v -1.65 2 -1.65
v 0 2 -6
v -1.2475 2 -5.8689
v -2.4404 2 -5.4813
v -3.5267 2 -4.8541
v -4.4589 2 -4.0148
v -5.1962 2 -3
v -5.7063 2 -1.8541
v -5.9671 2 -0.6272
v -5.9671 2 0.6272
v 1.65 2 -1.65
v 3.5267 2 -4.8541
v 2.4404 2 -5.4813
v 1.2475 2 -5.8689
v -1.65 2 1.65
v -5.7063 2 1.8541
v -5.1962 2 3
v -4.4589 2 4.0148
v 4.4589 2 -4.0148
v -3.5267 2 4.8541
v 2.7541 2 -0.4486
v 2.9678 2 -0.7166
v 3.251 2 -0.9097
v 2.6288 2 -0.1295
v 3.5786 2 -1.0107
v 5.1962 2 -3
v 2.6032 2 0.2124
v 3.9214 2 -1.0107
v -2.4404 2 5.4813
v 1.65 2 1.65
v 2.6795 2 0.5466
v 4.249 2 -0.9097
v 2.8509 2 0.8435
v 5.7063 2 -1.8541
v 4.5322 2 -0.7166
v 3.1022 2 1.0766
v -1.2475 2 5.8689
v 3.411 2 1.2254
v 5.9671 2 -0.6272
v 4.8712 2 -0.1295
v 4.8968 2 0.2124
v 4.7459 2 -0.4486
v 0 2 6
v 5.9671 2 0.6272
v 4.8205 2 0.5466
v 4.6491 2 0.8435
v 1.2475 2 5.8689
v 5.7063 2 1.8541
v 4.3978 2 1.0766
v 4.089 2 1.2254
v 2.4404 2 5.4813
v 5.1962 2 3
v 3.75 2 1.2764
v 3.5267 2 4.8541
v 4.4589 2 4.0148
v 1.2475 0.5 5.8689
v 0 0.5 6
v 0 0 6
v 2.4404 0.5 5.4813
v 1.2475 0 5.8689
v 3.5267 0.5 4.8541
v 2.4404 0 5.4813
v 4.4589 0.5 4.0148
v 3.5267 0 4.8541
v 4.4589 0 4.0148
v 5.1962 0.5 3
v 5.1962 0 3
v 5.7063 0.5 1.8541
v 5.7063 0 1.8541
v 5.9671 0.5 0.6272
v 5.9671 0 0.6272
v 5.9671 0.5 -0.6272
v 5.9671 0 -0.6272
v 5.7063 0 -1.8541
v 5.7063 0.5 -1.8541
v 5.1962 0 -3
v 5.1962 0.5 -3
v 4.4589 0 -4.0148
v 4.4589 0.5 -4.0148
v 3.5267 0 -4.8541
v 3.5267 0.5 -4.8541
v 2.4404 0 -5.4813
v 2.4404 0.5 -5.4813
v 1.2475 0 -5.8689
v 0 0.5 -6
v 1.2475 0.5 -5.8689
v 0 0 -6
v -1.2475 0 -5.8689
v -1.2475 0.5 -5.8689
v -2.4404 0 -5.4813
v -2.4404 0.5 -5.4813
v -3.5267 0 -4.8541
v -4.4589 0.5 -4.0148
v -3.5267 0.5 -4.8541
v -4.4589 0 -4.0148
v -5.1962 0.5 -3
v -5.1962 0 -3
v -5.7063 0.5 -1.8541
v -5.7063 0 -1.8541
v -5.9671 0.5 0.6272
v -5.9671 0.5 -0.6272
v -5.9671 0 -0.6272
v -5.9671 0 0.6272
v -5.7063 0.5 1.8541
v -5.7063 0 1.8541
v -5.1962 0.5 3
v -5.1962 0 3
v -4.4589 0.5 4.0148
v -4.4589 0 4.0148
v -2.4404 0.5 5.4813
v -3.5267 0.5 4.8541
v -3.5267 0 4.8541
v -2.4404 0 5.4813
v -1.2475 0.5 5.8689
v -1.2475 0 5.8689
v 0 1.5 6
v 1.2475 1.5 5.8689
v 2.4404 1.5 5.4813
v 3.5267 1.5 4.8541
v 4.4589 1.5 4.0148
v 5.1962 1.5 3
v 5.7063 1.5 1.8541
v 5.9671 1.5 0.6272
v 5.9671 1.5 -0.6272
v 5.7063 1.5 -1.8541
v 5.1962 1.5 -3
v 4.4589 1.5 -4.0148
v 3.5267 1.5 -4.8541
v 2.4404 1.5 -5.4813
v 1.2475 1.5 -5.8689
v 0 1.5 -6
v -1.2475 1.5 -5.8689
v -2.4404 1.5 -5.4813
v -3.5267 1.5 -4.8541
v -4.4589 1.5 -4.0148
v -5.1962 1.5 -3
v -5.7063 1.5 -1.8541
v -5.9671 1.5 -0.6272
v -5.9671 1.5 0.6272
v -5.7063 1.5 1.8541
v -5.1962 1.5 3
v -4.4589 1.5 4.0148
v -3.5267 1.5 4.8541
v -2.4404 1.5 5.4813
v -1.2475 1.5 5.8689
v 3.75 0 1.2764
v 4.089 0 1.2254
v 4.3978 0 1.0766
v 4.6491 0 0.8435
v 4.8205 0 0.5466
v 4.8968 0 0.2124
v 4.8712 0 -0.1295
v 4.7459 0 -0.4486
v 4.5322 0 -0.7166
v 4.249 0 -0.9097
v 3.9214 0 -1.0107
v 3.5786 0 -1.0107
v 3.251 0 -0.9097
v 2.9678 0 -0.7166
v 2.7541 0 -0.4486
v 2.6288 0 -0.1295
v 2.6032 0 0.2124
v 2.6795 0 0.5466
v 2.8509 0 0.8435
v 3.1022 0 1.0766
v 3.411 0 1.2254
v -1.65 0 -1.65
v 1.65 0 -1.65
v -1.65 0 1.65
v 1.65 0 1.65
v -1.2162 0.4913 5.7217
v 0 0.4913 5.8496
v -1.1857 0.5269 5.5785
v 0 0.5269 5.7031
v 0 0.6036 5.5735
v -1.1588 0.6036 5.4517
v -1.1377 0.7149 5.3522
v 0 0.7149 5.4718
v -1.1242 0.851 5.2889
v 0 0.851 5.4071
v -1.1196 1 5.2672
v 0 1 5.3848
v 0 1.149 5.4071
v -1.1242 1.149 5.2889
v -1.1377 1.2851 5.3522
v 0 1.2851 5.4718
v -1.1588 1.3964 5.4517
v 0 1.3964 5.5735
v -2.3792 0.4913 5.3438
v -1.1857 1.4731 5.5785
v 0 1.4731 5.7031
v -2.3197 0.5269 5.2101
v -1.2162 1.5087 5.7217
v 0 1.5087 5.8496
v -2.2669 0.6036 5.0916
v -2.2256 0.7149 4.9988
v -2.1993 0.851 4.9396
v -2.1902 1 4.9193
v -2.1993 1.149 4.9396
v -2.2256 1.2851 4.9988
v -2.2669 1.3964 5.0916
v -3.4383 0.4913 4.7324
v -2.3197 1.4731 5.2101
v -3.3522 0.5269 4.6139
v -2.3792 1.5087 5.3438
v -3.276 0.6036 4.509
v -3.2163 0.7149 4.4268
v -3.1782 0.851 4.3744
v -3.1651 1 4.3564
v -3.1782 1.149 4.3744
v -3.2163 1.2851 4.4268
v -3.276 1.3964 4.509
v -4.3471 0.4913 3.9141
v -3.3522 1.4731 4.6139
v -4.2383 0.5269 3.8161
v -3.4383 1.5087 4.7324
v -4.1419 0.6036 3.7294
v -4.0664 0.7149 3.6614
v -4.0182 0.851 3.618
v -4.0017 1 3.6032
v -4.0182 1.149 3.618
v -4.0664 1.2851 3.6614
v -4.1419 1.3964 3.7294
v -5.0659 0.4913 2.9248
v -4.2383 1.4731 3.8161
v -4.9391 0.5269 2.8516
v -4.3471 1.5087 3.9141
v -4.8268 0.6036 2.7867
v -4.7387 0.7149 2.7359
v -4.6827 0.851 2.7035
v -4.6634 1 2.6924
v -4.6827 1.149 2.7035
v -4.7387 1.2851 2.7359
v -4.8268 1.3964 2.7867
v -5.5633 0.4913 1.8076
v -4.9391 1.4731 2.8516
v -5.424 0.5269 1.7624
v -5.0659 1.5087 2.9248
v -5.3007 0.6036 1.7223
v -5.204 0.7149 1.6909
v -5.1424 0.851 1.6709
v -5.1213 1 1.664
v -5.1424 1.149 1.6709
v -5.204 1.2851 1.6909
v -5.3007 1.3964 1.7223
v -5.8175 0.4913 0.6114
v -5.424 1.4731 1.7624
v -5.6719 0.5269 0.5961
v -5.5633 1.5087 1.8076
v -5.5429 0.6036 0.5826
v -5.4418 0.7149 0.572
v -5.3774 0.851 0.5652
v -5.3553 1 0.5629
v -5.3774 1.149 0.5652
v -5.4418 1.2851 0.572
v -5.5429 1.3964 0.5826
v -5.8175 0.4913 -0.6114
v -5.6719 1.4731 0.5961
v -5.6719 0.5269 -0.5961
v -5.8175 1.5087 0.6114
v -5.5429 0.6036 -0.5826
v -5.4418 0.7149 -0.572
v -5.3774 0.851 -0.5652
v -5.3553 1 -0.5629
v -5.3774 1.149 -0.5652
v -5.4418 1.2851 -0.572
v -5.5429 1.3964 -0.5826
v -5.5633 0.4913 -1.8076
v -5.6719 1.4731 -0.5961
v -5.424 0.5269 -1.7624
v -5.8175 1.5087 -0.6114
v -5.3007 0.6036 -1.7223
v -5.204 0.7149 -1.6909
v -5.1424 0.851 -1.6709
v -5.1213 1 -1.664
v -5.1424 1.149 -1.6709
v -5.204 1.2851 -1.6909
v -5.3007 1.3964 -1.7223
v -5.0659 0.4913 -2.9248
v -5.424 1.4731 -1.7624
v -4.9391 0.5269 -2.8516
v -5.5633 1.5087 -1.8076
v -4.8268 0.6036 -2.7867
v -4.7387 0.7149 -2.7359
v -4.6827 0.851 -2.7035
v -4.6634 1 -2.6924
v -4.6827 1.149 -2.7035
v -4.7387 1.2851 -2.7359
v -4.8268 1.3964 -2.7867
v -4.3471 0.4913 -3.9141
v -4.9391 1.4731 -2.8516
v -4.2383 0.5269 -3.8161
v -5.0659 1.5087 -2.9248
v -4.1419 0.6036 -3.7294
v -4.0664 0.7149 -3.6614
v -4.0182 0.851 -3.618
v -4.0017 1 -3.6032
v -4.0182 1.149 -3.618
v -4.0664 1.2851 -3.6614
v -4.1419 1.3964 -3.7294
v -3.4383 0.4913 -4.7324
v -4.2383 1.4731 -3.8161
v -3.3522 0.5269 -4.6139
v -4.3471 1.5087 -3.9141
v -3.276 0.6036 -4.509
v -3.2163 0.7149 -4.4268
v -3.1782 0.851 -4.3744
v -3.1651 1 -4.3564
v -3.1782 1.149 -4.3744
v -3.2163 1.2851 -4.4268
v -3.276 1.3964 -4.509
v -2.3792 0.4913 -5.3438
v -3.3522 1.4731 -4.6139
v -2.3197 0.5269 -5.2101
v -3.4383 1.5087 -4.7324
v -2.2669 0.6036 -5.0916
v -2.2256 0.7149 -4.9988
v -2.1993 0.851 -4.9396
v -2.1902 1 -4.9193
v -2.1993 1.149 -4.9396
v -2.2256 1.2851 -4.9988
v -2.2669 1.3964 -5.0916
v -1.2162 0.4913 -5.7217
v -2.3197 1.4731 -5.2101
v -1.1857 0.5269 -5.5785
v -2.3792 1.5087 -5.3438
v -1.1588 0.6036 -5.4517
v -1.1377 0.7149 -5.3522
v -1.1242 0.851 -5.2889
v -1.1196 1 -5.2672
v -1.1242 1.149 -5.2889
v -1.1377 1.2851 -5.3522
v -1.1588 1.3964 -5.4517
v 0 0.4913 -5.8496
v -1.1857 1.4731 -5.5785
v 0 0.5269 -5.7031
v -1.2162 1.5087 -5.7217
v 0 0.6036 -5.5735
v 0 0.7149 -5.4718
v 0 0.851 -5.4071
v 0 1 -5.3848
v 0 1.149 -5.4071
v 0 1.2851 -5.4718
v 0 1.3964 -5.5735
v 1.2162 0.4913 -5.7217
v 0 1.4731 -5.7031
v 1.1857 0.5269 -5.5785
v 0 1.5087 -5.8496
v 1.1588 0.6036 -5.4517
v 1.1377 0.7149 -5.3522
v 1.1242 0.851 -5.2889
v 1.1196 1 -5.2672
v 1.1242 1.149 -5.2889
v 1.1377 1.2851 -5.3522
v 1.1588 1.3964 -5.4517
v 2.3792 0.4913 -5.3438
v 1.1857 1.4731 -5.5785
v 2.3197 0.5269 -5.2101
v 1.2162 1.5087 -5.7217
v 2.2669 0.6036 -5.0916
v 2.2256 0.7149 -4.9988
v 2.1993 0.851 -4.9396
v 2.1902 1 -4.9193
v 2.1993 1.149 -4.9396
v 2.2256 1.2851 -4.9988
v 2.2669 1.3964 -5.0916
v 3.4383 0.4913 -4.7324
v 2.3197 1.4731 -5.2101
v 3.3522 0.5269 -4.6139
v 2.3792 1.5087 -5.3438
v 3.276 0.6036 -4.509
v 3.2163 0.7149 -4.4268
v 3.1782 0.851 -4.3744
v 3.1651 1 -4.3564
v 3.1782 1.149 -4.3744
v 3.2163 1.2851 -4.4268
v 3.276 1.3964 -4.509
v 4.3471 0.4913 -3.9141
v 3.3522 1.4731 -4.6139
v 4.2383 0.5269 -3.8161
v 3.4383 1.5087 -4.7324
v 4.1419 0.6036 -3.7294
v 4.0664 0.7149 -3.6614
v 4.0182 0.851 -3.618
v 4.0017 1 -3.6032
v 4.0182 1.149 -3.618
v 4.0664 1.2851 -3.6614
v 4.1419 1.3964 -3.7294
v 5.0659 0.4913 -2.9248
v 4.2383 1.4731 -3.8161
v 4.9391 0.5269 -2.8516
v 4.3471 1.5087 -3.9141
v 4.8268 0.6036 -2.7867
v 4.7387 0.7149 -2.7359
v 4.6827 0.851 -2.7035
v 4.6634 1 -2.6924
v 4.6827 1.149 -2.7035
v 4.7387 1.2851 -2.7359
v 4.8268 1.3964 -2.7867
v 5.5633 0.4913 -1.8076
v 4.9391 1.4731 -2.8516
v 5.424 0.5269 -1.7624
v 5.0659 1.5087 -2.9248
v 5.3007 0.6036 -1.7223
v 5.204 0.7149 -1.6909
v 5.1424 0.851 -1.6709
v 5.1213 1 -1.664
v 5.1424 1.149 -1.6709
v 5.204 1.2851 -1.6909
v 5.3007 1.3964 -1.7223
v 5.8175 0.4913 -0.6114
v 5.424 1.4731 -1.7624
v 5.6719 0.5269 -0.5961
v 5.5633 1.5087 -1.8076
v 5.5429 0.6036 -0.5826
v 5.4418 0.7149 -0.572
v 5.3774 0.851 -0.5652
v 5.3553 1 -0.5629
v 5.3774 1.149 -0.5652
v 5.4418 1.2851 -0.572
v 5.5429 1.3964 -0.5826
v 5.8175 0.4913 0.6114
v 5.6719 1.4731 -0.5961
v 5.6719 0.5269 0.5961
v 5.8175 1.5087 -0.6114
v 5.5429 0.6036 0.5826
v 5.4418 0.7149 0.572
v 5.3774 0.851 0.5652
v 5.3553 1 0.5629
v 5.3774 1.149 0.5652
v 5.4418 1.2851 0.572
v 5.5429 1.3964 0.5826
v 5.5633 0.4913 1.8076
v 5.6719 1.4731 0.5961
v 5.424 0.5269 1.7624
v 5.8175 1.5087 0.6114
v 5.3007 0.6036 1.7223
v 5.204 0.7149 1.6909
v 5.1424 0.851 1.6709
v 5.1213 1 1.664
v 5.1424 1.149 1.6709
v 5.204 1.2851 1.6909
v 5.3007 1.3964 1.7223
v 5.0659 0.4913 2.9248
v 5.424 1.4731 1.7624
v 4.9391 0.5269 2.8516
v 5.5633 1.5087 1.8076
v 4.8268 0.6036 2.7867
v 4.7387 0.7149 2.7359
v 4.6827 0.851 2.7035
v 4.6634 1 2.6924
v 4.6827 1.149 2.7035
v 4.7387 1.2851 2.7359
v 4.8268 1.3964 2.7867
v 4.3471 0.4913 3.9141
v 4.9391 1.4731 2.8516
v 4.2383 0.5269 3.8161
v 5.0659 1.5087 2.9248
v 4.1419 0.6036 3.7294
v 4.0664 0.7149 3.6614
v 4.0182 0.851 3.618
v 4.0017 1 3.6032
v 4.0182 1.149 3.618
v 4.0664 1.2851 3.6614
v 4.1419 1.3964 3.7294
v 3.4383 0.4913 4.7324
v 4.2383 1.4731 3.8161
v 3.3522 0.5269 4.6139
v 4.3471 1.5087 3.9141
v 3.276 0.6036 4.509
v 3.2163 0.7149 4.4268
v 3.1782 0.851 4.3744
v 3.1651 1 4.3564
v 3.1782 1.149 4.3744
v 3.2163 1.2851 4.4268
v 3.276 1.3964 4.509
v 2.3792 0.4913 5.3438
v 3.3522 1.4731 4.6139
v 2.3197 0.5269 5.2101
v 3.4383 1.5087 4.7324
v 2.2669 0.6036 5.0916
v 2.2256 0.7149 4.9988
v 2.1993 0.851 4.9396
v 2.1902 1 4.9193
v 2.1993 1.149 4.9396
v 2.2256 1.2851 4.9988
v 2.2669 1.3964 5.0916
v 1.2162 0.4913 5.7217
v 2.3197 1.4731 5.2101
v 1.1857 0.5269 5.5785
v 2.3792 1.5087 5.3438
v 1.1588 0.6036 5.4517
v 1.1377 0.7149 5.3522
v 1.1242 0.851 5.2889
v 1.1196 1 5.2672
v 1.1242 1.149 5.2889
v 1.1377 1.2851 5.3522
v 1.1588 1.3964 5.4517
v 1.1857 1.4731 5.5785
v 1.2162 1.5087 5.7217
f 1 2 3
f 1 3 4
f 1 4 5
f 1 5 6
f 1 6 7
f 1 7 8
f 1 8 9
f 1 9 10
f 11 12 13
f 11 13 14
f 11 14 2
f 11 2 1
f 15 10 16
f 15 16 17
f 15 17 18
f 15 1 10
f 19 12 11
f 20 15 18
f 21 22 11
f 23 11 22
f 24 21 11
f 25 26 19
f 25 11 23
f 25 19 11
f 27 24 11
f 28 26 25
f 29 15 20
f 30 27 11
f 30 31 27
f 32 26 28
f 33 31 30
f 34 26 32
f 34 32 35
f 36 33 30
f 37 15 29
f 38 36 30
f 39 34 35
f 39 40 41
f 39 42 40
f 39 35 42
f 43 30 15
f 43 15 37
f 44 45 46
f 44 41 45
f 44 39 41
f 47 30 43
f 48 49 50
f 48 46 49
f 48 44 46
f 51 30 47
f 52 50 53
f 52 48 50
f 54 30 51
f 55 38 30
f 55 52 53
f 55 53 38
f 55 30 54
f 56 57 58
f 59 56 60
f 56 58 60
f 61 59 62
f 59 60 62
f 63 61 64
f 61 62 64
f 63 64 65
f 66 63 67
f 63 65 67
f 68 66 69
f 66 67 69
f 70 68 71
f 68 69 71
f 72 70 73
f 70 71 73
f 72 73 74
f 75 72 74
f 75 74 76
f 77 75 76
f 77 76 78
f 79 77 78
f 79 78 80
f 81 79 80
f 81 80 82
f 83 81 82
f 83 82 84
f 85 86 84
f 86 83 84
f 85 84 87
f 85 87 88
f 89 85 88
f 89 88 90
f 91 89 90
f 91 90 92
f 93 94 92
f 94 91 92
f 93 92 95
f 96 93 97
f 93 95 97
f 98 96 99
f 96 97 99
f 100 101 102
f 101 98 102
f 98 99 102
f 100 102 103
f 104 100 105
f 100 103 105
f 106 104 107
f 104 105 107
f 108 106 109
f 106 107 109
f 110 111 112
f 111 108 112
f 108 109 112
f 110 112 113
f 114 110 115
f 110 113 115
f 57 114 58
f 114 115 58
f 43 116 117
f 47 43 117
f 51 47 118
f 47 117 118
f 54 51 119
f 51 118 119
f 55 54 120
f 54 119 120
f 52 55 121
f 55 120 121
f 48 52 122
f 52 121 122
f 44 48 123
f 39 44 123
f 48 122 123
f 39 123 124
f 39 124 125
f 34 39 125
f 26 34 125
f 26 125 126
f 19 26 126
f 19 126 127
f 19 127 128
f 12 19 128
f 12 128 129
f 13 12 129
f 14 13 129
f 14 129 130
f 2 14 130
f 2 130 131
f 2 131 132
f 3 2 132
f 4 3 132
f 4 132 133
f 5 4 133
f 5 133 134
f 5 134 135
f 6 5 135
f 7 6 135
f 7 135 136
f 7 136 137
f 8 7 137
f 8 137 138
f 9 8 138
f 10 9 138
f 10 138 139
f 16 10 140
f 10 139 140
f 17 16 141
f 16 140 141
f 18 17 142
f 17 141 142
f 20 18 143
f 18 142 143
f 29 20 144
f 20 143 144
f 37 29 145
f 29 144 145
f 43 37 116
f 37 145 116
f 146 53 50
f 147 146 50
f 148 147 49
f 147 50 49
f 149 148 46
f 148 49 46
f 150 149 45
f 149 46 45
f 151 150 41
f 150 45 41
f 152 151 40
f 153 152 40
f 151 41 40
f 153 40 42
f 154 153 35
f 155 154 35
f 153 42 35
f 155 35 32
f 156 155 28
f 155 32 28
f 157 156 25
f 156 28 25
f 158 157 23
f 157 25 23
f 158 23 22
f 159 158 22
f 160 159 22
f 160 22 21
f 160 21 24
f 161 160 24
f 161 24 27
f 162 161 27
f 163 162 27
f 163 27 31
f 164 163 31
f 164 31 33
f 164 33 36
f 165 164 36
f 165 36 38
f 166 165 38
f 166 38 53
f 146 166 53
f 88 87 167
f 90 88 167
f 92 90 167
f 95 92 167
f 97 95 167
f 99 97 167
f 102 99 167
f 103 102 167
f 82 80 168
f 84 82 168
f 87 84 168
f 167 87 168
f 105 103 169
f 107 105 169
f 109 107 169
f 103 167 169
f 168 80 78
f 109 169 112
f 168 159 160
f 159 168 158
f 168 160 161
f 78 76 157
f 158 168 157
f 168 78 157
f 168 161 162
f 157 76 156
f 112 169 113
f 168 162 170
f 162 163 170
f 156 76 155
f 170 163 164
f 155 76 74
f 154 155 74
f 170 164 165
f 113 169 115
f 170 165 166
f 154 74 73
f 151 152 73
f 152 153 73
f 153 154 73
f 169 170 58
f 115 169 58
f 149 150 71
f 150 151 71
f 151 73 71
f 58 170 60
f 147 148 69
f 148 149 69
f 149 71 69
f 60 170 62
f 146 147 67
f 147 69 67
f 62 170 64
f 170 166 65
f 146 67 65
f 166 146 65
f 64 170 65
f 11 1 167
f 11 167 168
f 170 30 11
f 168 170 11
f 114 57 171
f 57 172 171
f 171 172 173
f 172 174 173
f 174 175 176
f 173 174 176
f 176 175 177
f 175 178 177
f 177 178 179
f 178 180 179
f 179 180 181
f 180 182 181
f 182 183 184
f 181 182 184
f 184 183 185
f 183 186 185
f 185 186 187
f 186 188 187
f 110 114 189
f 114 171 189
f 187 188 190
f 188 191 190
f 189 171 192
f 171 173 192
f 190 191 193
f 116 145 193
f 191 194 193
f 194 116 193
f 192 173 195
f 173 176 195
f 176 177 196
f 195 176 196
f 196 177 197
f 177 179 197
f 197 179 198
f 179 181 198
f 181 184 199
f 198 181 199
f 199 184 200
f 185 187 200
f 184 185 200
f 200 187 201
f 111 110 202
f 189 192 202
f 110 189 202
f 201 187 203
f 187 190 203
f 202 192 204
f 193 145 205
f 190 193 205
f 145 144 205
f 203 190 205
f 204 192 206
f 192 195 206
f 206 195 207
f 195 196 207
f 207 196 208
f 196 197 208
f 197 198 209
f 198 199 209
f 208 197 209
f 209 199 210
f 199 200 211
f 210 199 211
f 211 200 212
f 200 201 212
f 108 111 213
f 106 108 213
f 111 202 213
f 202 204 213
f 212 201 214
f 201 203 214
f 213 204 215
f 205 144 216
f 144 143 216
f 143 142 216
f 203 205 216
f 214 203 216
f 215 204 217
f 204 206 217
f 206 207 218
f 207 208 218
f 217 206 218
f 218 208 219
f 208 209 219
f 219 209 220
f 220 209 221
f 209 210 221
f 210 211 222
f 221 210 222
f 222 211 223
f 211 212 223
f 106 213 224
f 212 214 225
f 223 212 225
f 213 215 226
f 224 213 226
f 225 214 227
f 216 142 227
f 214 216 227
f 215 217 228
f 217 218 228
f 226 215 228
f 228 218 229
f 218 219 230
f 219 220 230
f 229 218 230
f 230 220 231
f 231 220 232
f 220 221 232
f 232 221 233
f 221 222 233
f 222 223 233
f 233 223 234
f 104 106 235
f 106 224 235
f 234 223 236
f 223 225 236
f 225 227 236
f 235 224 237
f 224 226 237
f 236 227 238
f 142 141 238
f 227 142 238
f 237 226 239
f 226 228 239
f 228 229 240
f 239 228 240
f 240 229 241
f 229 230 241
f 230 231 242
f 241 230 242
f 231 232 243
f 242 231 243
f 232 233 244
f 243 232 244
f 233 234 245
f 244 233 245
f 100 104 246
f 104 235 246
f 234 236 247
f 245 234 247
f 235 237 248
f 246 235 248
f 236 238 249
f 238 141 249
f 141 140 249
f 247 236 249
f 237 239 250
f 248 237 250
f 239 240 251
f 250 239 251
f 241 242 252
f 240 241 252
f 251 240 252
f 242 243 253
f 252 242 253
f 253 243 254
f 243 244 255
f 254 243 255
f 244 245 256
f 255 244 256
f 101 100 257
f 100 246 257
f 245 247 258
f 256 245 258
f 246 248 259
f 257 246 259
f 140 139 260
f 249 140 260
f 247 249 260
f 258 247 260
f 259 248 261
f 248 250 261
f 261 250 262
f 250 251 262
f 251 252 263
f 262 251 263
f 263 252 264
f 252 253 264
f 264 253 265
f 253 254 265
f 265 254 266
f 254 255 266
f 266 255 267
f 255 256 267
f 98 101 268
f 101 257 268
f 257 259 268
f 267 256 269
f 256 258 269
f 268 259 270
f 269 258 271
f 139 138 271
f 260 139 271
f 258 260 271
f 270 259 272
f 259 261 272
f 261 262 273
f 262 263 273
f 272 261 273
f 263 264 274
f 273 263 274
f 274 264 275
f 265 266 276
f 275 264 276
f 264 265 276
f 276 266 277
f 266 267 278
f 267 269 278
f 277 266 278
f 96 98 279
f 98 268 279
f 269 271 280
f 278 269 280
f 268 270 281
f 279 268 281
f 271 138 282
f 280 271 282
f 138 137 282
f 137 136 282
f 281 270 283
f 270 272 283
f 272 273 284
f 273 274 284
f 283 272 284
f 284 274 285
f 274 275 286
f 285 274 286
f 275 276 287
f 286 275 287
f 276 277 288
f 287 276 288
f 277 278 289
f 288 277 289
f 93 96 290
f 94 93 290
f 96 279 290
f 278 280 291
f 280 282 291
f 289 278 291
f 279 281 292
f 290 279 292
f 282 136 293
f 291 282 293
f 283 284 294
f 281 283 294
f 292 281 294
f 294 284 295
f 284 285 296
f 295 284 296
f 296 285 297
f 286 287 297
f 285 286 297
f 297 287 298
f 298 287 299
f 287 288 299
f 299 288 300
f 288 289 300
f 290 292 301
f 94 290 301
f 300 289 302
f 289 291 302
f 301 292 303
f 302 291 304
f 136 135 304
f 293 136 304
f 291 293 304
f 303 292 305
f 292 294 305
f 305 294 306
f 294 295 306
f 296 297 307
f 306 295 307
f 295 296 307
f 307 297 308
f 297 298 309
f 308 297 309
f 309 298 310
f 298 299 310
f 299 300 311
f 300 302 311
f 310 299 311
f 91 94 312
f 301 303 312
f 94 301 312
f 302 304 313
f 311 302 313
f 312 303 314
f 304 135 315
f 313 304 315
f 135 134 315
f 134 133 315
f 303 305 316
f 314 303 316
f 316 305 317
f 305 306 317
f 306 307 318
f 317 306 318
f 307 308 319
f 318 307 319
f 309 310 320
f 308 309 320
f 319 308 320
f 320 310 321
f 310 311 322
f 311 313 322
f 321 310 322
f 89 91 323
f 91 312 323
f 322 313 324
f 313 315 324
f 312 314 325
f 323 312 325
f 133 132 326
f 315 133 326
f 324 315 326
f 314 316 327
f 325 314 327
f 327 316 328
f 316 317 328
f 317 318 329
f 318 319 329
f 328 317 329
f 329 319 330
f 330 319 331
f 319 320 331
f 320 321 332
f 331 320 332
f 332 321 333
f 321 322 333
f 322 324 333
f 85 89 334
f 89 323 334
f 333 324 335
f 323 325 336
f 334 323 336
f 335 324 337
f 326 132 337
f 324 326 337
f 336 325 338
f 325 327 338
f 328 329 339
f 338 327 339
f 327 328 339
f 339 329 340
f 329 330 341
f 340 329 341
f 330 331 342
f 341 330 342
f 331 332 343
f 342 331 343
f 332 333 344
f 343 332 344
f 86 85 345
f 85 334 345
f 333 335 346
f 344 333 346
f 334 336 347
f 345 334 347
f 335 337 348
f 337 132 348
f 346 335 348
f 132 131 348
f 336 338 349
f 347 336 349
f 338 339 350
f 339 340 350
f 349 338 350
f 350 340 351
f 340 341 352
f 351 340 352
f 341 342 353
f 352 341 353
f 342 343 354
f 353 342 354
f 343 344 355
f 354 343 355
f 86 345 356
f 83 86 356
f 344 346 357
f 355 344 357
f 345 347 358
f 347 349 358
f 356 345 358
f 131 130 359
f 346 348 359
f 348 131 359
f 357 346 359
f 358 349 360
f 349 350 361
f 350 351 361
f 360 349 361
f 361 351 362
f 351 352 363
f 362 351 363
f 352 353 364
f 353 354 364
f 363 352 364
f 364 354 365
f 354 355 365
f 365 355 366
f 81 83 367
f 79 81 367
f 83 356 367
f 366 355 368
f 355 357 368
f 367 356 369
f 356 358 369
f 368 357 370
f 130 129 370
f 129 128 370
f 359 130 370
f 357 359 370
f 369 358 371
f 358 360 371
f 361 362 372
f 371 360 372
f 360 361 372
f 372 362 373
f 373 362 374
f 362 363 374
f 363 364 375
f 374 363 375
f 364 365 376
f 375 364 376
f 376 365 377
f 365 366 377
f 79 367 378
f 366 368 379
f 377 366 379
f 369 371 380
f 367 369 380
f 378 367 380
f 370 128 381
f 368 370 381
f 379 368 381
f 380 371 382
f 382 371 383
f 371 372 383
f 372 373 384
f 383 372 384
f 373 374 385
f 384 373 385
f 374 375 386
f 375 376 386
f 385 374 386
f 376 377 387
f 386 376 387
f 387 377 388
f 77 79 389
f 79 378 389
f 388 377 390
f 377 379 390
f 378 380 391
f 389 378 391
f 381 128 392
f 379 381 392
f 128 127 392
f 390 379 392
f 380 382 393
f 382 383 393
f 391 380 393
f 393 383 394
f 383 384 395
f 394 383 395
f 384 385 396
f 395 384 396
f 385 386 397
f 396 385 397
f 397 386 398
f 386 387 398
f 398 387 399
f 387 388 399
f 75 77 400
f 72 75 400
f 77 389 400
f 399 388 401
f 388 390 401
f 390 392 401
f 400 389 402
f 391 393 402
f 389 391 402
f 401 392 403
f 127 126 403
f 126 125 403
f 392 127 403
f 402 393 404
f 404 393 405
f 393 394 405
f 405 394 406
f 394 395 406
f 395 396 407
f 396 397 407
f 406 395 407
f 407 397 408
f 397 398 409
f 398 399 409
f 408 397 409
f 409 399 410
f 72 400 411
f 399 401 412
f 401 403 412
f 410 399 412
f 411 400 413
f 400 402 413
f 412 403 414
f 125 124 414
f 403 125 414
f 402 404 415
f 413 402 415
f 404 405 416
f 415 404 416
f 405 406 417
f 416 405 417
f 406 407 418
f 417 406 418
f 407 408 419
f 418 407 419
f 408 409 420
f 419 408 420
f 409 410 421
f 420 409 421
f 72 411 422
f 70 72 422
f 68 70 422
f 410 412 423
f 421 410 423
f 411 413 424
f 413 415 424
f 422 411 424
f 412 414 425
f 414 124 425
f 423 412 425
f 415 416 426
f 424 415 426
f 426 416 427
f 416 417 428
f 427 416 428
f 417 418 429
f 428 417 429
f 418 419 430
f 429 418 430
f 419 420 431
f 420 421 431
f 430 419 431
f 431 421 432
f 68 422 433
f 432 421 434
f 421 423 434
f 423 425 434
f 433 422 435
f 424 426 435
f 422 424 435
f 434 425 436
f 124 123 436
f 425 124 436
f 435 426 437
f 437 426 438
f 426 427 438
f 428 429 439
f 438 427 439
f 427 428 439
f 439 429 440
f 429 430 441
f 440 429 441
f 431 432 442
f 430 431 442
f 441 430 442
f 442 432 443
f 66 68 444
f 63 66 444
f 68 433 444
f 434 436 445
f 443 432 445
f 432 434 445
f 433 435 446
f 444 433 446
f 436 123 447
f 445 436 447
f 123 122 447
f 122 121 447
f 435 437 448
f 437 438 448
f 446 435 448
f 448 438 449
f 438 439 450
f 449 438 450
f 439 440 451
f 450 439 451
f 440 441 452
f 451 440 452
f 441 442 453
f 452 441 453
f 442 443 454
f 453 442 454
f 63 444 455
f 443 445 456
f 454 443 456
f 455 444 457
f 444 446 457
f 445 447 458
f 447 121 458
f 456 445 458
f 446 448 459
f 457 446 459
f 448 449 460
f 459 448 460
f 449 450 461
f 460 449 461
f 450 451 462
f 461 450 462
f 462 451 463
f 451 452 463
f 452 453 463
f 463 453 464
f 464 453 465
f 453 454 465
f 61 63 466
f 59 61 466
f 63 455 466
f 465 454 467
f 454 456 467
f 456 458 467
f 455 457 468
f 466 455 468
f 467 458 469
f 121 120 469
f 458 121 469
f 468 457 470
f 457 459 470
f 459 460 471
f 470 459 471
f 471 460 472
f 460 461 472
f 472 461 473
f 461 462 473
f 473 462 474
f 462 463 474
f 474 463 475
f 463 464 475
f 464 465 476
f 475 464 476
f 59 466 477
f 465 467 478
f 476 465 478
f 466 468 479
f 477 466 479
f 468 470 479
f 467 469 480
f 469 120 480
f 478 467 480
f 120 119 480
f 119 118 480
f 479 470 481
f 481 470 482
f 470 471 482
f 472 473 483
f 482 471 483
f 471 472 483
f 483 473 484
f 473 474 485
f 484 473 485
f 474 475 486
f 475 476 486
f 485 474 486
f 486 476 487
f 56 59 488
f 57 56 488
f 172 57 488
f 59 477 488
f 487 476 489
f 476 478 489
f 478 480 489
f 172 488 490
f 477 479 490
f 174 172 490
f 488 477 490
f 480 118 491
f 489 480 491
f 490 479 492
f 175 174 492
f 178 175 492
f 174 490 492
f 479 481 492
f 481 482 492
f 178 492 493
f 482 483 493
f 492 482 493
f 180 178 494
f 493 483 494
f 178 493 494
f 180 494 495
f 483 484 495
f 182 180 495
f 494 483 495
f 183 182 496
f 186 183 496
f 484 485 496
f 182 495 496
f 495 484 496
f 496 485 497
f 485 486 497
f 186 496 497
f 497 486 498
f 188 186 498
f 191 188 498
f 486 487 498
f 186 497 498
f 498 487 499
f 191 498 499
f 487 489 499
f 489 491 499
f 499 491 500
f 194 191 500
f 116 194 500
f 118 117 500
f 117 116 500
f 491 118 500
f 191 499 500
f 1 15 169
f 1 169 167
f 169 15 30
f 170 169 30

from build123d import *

# Parameters (mm, degrees)
SKIZZE1_R                       = 6
AUFSATZ_LINEAR_AUSTRAGEN1_DEPTH = 2
SKIZZE3_W                       = 3.3
SKIZZE3_H                       = 3.3
SCHNITT_LINEAR_AUSTRAGEN1_DEPTH = 3
SKIZZE4_R                       = 1.15
SCHNITT_LINEAR_AUSTRAGEN2_DEPTH = 3


with BuildPart() as part:
    # Skizze1 → Aufsatz-Linear austragen1 (new body)
    with BuildSketch(Plane(origin=(0, 0, 0), x_dir=(1, 0, 0), z_dir=(0, 1, 0))):
        with Locations(Location((0, 0, 0), (0, 0, 270))):
            Circle(SKIZZE1_R)
    extrude(amount=AUFSATZ_LINEAR_AUSTRAGEN1_DEPTH)

    # Skizze3 → Schnitt-Linear austragen1 (cut)
    with BuildSketch(Plane(origin=(0, 2, 0), x_dir=(1, 0, 0), z_dir=(0, 1, 0))):
        Rectangle(SKIZZE3_W, SKIZZE3_H)
    extrude(amount=-SCHNITT_LINEAR_AUSTRAGEN1_DEPTH, mode=Mode.SUBTRACT)

    # Skizze4 → Schnitt-Linear austragen2 (cut)
    with BuildSketch(Plane(origin=(0, 2, 0), x_dir=(1, 0, 0), z_dir=(0, 1, 0))):
        with Locations(Location((3.75, -0.126446108, 0), (0, 0, 270))):
            Circle(SKIZZE4_R)
    extrude(amount=-SCHNITT_LINEAR_AUSTRAGEN2_DEPTH, mode=Mode.SUBTRACT)

    # Skizze6 → Schnitt-Rotation2 (revolve, cut)
    with BuildSketch(Plane.XY, mode=Mode.PRIVATE) as schnitt_rotation2_sk:
        with BuildLine():
            Line((-6, 1.5), (-6, 0.5))
            ThreePointArc((-6, 0.5), (-5.384840005, 1), (-6, 1.5))
        make_face()
    revolve(schnitt_rotation2_sk.sketch.rotate(Axis((0, 2, 0), (0, -1, 0)), 270), axis=Axis((0, 2, 0), (0, -1, 0)), mode=Mode.SUBTRACT)


solid = part.part
